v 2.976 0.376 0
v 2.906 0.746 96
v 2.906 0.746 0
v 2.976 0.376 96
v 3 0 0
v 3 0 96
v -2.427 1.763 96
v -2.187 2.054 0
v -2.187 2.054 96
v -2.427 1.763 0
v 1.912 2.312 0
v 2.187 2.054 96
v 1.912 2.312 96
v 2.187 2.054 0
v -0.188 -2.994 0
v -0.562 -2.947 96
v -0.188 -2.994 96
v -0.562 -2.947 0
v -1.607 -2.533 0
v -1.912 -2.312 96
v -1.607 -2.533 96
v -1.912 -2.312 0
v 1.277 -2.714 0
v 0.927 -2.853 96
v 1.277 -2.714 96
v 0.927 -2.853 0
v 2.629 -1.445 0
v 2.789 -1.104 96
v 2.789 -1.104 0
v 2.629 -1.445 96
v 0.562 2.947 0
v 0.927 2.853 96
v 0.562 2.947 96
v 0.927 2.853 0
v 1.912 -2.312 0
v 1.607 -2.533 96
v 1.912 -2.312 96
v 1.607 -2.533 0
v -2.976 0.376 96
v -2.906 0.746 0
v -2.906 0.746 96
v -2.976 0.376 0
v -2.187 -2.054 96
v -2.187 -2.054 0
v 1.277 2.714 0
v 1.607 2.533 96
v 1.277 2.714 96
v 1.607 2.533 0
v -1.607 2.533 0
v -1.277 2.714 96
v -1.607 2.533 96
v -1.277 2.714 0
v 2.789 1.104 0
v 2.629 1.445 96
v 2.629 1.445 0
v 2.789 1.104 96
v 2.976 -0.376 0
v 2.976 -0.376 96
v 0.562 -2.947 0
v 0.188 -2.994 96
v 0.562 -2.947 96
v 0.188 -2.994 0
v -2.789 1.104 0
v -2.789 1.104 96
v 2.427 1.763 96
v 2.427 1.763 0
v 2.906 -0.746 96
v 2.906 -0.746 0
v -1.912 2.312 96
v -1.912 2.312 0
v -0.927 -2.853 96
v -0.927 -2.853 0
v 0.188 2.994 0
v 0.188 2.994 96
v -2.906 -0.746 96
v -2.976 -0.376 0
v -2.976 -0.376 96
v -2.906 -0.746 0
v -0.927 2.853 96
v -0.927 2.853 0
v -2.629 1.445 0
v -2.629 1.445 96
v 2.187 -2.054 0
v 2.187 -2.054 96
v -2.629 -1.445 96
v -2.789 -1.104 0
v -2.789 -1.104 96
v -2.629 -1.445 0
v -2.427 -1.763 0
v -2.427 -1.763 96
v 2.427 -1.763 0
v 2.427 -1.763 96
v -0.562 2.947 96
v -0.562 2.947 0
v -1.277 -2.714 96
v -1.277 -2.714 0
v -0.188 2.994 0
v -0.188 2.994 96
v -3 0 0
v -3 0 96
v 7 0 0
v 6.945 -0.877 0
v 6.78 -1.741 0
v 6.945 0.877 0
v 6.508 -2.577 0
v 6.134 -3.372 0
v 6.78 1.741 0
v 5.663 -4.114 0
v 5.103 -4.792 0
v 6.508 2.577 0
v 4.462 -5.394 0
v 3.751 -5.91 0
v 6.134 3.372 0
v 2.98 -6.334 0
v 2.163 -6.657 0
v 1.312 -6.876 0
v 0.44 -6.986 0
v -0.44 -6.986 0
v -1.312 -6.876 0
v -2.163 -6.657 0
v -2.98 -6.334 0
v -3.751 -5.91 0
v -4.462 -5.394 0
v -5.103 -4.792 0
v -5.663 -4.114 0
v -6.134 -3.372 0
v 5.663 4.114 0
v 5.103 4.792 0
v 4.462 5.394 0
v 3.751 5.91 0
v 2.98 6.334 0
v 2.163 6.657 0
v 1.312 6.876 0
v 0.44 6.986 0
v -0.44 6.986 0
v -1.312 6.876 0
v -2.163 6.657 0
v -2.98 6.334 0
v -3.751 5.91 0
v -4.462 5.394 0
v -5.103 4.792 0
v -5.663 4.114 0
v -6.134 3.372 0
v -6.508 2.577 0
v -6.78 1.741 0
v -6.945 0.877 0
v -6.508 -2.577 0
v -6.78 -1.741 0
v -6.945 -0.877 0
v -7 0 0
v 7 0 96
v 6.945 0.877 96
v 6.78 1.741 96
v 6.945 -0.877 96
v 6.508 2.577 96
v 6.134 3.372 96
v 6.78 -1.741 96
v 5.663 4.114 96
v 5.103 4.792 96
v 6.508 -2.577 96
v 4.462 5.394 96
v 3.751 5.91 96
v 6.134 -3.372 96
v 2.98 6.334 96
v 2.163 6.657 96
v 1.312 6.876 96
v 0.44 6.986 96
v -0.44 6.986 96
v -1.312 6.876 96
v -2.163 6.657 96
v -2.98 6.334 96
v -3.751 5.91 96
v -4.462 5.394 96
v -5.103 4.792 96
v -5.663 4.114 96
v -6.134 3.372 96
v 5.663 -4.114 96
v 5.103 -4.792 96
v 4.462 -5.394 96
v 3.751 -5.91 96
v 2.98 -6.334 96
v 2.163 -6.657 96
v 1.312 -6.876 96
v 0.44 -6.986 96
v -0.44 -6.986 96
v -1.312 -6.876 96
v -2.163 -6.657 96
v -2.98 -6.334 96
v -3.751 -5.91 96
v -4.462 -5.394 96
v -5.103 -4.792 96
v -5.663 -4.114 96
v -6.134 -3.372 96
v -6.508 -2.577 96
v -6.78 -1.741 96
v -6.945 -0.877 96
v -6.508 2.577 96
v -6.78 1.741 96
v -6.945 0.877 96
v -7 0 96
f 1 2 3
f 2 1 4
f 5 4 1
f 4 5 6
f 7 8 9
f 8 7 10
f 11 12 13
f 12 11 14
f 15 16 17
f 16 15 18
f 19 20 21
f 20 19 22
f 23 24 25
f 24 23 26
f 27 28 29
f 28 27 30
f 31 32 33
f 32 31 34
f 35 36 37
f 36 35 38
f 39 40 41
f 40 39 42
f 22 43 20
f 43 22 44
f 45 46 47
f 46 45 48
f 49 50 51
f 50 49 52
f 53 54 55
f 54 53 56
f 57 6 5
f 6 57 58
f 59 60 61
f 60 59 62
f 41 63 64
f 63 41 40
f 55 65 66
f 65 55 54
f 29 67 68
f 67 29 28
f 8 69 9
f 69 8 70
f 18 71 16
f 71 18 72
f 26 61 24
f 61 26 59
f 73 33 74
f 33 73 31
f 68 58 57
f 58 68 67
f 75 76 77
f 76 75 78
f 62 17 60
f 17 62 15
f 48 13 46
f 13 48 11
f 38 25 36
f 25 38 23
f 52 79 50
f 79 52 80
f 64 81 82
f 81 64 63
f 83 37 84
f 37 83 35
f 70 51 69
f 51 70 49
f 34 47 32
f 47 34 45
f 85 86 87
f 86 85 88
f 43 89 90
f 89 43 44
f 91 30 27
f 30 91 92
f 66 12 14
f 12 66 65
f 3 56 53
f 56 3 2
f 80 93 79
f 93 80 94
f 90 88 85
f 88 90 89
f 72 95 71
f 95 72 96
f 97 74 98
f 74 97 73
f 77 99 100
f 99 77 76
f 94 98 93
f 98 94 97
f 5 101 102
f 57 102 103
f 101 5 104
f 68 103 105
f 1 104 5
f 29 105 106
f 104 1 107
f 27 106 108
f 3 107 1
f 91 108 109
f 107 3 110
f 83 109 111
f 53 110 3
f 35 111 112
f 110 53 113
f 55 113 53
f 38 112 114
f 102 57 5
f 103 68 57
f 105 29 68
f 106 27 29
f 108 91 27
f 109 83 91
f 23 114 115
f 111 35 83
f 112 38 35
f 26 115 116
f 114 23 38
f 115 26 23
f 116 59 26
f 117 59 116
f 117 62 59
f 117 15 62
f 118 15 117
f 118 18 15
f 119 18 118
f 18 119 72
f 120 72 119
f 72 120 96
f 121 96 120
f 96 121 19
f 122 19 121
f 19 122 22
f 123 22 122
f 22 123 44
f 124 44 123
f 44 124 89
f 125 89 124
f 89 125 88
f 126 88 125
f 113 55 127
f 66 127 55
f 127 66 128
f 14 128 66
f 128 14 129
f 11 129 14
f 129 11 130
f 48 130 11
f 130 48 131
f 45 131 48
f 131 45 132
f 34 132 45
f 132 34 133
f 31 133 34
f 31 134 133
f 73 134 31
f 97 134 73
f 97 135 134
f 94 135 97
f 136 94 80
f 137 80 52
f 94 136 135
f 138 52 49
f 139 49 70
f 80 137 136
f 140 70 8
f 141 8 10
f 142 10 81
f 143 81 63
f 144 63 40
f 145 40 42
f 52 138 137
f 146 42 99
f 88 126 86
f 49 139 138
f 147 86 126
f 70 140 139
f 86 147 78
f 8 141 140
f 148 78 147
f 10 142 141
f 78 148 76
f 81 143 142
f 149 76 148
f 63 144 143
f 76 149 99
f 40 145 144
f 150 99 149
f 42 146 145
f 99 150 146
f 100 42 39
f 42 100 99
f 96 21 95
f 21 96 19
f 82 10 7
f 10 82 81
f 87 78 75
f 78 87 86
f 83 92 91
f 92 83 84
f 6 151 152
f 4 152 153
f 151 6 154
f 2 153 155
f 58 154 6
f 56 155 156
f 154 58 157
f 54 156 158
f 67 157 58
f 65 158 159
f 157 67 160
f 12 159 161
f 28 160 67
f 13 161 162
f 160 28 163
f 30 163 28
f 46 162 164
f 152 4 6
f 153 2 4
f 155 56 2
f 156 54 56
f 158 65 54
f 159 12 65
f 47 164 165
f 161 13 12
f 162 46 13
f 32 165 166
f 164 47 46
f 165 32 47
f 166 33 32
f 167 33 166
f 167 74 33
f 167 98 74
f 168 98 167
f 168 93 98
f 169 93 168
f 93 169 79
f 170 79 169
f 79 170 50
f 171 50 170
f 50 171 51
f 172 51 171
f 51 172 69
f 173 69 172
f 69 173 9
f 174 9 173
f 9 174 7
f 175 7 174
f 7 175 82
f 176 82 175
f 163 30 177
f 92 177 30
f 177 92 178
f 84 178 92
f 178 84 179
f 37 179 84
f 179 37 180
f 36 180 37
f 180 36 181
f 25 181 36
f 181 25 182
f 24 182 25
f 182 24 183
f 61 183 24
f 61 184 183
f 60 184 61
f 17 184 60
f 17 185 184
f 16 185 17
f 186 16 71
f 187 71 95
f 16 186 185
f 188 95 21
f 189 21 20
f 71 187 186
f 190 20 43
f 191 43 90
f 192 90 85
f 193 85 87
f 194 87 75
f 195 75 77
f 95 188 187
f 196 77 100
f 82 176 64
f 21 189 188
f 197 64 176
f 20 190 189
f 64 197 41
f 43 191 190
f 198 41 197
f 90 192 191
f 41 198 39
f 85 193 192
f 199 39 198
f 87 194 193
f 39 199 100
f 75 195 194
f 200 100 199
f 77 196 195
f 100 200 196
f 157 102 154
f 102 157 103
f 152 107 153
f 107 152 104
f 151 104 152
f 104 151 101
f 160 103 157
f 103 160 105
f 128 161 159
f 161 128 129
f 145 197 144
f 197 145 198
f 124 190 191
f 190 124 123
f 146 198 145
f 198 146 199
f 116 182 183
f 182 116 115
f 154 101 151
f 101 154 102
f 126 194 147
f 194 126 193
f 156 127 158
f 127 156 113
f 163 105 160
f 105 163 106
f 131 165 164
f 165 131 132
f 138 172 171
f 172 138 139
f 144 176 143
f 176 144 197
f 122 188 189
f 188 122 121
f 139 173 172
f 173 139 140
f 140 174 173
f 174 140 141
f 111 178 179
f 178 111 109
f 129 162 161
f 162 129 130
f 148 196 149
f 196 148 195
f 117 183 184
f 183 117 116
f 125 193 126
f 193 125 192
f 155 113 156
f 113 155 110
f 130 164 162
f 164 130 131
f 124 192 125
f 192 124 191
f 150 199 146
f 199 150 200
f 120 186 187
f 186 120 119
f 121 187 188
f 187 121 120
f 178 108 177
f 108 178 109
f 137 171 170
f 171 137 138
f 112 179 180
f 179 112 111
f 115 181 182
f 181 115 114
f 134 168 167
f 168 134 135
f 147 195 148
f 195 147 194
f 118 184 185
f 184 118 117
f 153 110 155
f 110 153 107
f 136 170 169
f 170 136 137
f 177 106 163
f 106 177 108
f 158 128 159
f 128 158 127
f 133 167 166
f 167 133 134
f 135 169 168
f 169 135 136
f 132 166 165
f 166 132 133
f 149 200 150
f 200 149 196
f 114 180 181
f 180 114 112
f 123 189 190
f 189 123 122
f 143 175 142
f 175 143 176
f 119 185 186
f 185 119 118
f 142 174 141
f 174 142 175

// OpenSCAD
$fn = 50;


difference() {
	union() {
		cylinder(h = 96, r = 7.0000000000);
	}
	union() {
		cylinder(h = 96, r = 3.0000000000);
		cylinder(h = 96, r = 1.5000000000);
		cylinder(h = 96, r = 1.5000000000);
		cylinder(h = 96, r = 1.5000000000);
	}
}
